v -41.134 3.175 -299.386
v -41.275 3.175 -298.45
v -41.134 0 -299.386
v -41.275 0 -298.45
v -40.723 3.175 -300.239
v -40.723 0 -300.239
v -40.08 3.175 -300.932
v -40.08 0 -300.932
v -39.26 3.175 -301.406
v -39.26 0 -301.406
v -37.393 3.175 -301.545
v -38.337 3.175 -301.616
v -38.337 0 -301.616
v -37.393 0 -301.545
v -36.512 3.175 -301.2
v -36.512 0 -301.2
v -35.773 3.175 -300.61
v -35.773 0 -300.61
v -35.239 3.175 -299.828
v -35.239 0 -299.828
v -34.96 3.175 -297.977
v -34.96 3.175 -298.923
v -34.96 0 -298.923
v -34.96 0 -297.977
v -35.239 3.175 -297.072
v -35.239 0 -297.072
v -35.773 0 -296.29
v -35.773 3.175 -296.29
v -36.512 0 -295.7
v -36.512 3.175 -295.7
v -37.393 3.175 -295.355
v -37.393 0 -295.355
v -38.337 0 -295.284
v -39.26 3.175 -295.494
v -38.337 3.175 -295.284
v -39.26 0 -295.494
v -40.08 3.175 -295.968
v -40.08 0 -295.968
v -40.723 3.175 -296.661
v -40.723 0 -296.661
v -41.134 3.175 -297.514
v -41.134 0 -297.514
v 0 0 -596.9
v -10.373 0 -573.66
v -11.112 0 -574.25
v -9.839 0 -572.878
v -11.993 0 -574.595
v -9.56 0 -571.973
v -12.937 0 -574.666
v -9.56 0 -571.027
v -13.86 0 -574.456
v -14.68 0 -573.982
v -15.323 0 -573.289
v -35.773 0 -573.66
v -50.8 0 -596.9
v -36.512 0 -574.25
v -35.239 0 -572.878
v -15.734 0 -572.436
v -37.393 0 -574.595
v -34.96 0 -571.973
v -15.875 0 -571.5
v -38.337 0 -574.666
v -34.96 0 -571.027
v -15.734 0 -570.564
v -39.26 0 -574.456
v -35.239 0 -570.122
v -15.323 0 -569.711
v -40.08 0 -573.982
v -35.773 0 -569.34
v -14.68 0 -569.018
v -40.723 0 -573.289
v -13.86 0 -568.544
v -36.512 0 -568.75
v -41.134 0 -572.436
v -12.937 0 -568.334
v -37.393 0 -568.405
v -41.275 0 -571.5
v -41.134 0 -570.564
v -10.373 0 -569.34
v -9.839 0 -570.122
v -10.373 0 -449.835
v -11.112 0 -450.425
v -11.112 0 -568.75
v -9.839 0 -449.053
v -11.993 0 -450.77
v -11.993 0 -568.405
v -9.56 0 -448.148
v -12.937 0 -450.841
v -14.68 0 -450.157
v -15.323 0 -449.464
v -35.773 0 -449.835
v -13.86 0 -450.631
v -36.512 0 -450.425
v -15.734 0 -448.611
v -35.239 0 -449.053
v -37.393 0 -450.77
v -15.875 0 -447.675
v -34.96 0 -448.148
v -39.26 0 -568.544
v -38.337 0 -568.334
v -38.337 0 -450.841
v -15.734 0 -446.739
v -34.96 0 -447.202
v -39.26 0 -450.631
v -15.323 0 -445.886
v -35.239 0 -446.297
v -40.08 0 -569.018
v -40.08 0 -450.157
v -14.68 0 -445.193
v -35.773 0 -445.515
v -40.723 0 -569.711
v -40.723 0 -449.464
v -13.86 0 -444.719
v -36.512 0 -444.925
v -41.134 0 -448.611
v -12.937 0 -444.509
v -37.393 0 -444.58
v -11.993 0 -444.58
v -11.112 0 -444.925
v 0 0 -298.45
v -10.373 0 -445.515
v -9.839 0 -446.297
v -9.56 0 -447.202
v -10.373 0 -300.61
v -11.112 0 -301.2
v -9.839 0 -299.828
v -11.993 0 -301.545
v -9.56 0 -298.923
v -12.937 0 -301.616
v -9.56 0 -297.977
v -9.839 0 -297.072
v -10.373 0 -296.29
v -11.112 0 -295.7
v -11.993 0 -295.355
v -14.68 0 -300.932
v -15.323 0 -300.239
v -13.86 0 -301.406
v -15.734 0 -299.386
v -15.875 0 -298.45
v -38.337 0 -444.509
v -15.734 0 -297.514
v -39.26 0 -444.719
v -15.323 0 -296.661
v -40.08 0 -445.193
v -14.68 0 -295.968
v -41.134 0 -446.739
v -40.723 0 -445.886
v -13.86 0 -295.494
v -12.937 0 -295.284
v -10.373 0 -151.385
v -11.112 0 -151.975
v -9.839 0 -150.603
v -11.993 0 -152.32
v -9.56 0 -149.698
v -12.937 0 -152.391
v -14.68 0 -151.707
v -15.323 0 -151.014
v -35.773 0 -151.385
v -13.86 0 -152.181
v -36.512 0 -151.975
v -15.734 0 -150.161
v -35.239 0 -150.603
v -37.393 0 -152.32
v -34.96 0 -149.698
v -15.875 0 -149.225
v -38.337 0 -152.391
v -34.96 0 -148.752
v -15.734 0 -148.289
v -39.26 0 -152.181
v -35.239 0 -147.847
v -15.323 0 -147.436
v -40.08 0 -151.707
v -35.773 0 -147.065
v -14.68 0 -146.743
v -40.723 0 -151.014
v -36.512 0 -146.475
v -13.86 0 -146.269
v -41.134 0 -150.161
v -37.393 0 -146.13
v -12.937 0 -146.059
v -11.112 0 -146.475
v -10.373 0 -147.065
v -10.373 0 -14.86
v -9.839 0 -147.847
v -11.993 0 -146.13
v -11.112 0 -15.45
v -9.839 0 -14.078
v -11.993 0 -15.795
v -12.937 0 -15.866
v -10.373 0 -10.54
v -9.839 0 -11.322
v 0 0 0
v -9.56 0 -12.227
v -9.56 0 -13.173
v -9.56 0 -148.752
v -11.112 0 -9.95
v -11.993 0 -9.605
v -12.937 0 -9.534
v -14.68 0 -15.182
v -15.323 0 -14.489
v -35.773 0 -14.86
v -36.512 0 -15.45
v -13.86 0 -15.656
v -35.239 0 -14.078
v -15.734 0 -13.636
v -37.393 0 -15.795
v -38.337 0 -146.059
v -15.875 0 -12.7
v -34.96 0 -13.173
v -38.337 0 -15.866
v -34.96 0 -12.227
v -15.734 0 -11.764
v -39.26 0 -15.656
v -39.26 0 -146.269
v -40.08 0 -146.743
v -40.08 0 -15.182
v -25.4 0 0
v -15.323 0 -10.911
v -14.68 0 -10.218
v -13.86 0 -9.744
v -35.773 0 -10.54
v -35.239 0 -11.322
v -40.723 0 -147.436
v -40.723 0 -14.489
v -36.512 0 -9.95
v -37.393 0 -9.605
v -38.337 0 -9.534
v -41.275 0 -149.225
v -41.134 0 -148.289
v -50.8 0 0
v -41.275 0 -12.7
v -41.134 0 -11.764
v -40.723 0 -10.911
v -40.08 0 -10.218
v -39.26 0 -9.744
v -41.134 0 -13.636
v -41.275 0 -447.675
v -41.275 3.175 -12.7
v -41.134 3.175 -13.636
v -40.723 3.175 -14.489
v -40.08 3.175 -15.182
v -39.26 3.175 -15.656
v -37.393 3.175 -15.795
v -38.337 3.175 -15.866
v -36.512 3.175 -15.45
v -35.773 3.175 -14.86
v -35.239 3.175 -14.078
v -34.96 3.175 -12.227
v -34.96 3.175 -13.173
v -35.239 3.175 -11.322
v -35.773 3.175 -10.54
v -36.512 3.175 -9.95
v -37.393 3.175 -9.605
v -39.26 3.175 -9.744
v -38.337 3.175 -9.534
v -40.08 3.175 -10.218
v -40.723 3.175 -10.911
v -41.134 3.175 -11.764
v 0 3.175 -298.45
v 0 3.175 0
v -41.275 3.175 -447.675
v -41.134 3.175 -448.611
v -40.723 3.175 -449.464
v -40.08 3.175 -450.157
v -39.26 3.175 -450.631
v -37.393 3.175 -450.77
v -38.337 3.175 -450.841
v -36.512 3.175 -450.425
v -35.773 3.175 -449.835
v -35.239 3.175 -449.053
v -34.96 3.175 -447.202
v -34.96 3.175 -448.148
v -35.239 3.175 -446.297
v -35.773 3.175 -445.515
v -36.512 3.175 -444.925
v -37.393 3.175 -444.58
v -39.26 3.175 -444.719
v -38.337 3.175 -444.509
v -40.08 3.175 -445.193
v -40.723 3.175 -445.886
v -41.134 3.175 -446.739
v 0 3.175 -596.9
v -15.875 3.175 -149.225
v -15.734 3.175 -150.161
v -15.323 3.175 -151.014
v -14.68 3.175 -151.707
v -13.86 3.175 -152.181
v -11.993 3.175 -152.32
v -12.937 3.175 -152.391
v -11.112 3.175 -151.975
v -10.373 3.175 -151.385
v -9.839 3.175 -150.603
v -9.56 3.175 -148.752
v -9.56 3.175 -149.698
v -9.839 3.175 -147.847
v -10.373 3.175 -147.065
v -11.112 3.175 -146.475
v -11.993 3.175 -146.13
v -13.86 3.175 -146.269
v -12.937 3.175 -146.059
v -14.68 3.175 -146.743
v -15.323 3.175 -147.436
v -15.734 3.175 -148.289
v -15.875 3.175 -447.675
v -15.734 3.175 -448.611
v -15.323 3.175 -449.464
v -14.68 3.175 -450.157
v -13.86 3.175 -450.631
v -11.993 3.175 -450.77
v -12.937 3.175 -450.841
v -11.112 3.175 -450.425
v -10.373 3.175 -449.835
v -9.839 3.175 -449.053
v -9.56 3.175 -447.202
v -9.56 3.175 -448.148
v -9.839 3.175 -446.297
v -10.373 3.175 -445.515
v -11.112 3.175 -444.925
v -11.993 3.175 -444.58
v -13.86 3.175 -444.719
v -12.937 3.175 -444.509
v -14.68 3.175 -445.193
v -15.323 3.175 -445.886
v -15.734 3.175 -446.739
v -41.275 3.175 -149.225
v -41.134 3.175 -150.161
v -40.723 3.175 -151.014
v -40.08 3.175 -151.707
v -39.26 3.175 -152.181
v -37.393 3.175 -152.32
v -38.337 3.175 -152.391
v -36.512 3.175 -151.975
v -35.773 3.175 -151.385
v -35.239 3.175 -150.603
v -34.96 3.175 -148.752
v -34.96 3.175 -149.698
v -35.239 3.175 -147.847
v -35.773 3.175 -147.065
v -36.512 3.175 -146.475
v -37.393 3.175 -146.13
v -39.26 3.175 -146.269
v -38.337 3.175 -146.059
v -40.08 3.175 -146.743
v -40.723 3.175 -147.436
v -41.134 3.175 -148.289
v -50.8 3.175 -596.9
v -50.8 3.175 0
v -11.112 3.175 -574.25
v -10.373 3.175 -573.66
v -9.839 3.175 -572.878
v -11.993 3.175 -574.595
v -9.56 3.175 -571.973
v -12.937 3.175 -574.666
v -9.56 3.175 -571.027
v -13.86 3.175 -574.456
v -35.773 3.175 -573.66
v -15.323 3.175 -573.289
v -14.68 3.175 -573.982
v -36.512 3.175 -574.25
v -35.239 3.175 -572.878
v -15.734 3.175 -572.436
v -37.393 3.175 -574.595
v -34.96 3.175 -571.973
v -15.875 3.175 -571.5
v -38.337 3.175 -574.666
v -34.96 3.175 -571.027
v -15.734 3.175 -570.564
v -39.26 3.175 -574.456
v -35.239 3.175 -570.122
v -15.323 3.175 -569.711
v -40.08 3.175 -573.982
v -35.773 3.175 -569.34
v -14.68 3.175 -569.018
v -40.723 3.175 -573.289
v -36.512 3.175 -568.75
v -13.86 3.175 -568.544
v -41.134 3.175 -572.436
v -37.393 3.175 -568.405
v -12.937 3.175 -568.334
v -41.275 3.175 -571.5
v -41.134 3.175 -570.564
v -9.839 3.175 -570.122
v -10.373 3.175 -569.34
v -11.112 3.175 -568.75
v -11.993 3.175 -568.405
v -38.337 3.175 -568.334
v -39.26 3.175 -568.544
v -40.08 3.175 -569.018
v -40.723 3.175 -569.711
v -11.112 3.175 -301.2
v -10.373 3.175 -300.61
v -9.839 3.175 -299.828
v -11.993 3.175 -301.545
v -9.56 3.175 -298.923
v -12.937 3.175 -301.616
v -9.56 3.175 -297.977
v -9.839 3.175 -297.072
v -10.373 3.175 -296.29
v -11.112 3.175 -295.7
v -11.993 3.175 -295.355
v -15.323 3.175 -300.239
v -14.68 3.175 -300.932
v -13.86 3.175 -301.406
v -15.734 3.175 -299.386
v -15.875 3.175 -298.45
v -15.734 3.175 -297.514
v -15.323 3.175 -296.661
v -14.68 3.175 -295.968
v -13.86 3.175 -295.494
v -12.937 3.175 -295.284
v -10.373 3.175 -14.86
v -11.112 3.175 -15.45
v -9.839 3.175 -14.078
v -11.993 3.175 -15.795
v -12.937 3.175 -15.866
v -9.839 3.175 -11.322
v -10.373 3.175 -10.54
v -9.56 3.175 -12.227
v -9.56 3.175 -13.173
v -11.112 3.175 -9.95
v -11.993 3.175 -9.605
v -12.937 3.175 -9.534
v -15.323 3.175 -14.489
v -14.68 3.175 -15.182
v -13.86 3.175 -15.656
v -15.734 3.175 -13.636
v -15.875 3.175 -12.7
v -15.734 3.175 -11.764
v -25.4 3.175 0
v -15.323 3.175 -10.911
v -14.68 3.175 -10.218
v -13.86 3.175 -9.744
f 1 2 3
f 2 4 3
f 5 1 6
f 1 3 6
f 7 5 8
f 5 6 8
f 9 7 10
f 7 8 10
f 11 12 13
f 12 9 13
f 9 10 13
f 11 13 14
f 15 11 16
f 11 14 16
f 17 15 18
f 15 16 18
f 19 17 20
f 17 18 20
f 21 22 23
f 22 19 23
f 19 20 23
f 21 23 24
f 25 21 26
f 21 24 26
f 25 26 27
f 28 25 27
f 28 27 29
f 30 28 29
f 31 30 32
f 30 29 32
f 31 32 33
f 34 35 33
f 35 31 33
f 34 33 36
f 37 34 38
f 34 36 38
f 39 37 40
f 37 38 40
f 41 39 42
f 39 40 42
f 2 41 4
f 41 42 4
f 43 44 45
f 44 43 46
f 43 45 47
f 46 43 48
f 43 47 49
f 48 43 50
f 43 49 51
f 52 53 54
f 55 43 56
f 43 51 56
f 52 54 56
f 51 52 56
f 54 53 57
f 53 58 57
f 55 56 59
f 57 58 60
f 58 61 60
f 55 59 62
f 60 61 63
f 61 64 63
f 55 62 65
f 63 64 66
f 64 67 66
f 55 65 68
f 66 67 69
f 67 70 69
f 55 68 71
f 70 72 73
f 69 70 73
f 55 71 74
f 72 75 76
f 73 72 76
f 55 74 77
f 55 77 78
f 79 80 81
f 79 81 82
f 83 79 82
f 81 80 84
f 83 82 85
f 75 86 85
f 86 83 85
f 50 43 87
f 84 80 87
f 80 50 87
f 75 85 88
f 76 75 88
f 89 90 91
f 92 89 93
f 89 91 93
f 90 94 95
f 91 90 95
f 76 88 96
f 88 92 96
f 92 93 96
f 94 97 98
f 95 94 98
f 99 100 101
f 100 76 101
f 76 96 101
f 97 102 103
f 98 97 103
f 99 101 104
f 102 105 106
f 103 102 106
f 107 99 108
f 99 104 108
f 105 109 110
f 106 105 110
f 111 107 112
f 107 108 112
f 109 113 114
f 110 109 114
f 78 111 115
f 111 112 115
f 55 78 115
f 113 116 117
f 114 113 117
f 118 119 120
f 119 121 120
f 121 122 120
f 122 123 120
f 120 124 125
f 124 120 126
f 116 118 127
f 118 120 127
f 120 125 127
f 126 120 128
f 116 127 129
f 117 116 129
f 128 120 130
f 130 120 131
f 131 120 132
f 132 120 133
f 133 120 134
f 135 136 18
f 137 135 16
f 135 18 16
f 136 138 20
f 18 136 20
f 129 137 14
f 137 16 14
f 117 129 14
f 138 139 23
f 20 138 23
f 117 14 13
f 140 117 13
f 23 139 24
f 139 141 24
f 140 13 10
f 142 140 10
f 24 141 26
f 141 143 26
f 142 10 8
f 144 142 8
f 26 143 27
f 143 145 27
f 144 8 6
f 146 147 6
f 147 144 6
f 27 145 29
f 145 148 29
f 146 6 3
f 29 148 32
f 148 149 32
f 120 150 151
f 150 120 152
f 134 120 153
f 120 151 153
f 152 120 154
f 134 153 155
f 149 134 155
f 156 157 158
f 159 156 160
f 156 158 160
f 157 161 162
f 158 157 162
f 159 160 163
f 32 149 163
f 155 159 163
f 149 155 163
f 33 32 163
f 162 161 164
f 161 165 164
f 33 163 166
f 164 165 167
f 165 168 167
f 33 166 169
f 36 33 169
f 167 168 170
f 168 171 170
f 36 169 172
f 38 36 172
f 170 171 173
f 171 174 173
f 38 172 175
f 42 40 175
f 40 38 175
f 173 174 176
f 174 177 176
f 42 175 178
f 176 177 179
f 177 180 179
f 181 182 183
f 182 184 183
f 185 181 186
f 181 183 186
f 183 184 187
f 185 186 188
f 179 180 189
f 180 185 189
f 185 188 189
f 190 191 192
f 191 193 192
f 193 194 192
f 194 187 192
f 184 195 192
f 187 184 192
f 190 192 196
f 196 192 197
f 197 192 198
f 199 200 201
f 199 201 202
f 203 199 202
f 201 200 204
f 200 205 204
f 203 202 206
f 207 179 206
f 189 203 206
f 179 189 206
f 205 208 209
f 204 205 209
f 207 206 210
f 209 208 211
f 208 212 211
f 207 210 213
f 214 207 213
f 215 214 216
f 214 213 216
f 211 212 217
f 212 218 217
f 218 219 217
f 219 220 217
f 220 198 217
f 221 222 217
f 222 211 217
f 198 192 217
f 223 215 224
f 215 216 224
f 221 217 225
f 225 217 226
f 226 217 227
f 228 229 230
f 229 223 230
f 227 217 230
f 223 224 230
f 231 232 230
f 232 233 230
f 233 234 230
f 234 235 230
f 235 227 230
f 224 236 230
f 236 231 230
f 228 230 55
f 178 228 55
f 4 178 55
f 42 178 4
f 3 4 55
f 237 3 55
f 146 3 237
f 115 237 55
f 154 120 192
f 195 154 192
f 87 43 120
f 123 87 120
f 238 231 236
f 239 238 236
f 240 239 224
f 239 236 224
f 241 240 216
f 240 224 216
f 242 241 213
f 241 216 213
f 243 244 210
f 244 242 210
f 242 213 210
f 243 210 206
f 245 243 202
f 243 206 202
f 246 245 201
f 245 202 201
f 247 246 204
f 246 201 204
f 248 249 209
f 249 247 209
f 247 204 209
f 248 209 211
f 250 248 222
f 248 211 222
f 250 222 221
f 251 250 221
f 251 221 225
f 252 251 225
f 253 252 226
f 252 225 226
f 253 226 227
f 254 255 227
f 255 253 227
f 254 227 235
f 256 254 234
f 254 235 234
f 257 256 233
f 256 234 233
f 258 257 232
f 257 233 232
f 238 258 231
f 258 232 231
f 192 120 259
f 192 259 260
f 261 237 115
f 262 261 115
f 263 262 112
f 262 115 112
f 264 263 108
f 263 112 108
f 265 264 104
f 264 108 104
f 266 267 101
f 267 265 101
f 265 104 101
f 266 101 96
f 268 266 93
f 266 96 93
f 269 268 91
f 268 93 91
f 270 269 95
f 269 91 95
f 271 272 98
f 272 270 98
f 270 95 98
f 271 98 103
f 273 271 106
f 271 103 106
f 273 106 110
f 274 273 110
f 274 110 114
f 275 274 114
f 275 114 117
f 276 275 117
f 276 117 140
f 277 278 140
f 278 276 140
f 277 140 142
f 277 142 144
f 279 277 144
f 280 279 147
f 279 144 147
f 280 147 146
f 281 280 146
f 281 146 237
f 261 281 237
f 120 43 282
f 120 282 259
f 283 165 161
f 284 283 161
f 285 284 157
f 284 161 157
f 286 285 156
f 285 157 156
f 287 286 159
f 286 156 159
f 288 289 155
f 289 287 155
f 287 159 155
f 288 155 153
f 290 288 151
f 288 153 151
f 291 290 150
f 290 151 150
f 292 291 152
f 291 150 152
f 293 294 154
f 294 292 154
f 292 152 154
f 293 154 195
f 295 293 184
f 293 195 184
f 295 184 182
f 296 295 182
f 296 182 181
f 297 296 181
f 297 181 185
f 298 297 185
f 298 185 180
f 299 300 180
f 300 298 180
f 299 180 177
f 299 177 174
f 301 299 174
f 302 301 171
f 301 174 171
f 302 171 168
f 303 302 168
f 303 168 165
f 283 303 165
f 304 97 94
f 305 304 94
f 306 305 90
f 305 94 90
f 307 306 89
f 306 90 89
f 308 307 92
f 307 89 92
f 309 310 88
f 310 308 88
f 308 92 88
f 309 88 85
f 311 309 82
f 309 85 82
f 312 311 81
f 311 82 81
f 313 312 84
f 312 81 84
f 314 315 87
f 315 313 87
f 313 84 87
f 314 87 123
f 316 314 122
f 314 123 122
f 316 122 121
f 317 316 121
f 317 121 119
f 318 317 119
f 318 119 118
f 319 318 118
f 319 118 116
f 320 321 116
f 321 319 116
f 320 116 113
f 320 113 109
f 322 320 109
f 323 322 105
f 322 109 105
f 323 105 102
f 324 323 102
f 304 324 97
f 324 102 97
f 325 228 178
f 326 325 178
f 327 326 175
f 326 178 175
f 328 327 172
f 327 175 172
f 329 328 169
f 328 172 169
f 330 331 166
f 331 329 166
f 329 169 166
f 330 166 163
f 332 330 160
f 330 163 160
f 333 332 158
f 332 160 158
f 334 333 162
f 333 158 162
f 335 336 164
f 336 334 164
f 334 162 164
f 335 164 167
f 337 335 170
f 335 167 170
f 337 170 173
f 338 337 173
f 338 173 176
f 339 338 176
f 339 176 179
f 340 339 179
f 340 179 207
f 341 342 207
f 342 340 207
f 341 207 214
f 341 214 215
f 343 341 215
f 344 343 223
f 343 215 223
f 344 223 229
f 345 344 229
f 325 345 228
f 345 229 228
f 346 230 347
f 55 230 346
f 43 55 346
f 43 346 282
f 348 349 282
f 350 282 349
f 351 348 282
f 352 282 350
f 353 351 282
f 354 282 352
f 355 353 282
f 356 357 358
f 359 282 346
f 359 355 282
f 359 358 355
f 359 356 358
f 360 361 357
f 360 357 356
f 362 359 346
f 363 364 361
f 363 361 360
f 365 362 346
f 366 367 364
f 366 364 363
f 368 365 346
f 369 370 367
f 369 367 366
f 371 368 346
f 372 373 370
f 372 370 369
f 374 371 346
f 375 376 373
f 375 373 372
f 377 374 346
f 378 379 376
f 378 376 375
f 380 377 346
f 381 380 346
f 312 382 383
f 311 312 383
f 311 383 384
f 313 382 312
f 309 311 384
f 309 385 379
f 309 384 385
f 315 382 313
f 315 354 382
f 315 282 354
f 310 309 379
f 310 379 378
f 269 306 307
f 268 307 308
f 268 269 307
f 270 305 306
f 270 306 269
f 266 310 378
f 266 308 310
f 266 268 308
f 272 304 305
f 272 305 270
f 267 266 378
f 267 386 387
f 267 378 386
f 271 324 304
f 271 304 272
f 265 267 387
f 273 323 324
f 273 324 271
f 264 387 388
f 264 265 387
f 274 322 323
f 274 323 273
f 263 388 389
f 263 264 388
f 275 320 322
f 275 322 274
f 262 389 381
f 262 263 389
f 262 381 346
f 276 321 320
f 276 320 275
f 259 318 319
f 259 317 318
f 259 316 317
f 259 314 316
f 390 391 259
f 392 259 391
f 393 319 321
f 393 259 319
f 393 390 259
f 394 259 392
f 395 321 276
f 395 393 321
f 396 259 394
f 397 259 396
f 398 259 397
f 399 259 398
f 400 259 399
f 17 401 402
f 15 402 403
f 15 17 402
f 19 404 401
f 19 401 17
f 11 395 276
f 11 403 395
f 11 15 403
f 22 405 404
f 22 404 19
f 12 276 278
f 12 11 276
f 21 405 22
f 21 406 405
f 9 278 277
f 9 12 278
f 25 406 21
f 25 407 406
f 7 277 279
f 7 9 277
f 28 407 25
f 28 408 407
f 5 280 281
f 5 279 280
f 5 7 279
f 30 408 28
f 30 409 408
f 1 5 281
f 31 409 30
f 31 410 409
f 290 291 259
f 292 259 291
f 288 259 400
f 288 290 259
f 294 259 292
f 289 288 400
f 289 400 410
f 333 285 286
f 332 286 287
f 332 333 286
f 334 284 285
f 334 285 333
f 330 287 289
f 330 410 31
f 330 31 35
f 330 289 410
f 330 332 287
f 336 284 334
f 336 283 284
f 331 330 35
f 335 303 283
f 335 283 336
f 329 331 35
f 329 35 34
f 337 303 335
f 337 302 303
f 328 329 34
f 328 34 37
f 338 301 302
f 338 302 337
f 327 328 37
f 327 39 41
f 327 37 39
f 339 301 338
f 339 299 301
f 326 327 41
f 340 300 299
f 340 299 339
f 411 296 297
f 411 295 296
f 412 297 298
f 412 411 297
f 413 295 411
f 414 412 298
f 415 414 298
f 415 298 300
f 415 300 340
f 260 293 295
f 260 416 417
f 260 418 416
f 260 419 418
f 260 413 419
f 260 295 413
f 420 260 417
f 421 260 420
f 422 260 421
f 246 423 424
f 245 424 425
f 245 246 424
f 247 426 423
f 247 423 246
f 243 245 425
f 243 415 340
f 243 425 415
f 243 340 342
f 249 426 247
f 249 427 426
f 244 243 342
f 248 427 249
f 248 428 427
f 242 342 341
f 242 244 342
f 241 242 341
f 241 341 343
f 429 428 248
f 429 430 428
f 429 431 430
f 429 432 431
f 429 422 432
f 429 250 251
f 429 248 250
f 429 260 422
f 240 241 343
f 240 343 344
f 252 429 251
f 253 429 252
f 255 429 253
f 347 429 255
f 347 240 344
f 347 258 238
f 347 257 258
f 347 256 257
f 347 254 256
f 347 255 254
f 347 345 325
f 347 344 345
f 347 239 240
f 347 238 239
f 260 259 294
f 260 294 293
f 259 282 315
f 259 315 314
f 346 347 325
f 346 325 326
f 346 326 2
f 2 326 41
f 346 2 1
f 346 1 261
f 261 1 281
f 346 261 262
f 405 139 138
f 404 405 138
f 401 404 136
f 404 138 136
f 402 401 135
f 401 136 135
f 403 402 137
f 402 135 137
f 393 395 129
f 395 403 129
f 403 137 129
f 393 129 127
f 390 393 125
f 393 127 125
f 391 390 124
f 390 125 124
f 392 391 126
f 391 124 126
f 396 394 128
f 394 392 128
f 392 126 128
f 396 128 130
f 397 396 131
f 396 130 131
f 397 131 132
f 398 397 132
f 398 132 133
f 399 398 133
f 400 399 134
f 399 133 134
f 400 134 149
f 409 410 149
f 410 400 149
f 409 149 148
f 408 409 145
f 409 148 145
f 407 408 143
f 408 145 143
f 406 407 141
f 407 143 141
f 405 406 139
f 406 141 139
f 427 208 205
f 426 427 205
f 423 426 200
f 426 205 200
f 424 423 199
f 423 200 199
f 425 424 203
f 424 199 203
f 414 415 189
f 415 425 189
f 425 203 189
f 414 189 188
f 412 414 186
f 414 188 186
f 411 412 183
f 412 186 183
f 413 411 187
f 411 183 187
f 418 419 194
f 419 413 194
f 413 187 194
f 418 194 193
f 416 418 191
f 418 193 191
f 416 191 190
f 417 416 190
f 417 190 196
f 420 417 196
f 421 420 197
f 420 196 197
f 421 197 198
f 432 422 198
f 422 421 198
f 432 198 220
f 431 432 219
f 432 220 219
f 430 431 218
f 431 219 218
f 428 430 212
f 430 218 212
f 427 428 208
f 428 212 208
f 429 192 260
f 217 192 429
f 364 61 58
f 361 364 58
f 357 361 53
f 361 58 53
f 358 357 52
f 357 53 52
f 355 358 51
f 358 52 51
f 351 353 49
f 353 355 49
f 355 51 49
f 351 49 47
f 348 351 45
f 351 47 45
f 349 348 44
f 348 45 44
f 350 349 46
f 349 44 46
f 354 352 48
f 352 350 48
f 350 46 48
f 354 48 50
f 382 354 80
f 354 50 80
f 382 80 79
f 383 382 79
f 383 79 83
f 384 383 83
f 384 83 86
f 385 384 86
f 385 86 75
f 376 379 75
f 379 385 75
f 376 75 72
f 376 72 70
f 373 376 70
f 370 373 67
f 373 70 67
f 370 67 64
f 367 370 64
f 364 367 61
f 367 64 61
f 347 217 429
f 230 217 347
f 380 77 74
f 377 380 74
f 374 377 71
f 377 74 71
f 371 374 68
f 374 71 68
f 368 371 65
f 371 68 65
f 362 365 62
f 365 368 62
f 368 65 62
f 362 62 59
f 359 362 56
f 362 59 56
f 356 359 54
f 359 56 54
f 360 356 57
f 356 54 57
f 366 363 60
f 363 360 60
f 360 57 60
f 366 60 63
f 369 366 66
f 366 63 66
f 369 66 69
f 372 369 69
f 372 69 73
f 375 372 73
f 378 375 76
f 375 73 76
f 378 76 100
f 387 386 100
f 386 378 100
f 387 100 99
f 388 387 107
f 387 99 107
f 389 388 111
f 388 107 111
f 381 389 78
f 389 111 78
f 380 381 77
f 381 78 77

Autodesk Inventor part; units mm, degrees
ref_plane "YZ Plane" through (0, 0, 0) normal (1, 0, 0) x (0, 1, 0)
ref_plane "XZ Plane" through (0, 0, 0) normal (0, 1, 0) x (-1, 0, 0)
ref_plane "XY Plane" through (0, 0, 0) normal (0, 0, 1) x (1, 0, 0)
sketch "Sketch1" plane through (0, 0, 0) normal (0, 1, 0) x (-1, 0, 0)
  line L0 (0, 0) -> (50.8, 0)
  line L1 (50.8, 0) -> (50.8, -596.9)
  line L2 (50.8, -596.9) -> (0, -596.9)
  line L3 (0, -596.9) -> (0, 0)
  circle A0 centre (38.1, -12.7) radius 3.175
  line L4 (25.4, 0) -> (25.4, -12.7)
  circle A1 centre (38.1, -571.5) radius 3.175
  circle A2 centre (38.1, -298.45) radius 3.175
  circle A3 centre (12.7, -571.5) radius 3.175
  circle A4 centre (12.7, -298.45) radius 3.175
  circle A5 centre (12.7, -12.7) radius 3.175
  circle A6 centre (38.1, -149.225) radius 3.175
  line L5 (0, -298.45) -> (4.0649, -298.45)
  circle A7 centre (12.7, -149.225) radius 3.175
  circle A8 centre (38.1, -447.675) radius 3.175
  circle A9 centre (12.7, -447.675) radius 3.175
  dimension "d0" = 50.8
  dimension "d1" = 596.9
  dimension "d4" = 6.35
  dimension "d5" = 12.7
  dimension "d6" = 12.7
  dimension "d11" = 6.35
  dimension "d12" = 298.45
  dimension "d13" = 6.35
  dimension "d14" = 149.225
extrude "Extrusion1" add sketch "Sketch1" along normal blind 3.175
properties part number "Plate2inx47in"
